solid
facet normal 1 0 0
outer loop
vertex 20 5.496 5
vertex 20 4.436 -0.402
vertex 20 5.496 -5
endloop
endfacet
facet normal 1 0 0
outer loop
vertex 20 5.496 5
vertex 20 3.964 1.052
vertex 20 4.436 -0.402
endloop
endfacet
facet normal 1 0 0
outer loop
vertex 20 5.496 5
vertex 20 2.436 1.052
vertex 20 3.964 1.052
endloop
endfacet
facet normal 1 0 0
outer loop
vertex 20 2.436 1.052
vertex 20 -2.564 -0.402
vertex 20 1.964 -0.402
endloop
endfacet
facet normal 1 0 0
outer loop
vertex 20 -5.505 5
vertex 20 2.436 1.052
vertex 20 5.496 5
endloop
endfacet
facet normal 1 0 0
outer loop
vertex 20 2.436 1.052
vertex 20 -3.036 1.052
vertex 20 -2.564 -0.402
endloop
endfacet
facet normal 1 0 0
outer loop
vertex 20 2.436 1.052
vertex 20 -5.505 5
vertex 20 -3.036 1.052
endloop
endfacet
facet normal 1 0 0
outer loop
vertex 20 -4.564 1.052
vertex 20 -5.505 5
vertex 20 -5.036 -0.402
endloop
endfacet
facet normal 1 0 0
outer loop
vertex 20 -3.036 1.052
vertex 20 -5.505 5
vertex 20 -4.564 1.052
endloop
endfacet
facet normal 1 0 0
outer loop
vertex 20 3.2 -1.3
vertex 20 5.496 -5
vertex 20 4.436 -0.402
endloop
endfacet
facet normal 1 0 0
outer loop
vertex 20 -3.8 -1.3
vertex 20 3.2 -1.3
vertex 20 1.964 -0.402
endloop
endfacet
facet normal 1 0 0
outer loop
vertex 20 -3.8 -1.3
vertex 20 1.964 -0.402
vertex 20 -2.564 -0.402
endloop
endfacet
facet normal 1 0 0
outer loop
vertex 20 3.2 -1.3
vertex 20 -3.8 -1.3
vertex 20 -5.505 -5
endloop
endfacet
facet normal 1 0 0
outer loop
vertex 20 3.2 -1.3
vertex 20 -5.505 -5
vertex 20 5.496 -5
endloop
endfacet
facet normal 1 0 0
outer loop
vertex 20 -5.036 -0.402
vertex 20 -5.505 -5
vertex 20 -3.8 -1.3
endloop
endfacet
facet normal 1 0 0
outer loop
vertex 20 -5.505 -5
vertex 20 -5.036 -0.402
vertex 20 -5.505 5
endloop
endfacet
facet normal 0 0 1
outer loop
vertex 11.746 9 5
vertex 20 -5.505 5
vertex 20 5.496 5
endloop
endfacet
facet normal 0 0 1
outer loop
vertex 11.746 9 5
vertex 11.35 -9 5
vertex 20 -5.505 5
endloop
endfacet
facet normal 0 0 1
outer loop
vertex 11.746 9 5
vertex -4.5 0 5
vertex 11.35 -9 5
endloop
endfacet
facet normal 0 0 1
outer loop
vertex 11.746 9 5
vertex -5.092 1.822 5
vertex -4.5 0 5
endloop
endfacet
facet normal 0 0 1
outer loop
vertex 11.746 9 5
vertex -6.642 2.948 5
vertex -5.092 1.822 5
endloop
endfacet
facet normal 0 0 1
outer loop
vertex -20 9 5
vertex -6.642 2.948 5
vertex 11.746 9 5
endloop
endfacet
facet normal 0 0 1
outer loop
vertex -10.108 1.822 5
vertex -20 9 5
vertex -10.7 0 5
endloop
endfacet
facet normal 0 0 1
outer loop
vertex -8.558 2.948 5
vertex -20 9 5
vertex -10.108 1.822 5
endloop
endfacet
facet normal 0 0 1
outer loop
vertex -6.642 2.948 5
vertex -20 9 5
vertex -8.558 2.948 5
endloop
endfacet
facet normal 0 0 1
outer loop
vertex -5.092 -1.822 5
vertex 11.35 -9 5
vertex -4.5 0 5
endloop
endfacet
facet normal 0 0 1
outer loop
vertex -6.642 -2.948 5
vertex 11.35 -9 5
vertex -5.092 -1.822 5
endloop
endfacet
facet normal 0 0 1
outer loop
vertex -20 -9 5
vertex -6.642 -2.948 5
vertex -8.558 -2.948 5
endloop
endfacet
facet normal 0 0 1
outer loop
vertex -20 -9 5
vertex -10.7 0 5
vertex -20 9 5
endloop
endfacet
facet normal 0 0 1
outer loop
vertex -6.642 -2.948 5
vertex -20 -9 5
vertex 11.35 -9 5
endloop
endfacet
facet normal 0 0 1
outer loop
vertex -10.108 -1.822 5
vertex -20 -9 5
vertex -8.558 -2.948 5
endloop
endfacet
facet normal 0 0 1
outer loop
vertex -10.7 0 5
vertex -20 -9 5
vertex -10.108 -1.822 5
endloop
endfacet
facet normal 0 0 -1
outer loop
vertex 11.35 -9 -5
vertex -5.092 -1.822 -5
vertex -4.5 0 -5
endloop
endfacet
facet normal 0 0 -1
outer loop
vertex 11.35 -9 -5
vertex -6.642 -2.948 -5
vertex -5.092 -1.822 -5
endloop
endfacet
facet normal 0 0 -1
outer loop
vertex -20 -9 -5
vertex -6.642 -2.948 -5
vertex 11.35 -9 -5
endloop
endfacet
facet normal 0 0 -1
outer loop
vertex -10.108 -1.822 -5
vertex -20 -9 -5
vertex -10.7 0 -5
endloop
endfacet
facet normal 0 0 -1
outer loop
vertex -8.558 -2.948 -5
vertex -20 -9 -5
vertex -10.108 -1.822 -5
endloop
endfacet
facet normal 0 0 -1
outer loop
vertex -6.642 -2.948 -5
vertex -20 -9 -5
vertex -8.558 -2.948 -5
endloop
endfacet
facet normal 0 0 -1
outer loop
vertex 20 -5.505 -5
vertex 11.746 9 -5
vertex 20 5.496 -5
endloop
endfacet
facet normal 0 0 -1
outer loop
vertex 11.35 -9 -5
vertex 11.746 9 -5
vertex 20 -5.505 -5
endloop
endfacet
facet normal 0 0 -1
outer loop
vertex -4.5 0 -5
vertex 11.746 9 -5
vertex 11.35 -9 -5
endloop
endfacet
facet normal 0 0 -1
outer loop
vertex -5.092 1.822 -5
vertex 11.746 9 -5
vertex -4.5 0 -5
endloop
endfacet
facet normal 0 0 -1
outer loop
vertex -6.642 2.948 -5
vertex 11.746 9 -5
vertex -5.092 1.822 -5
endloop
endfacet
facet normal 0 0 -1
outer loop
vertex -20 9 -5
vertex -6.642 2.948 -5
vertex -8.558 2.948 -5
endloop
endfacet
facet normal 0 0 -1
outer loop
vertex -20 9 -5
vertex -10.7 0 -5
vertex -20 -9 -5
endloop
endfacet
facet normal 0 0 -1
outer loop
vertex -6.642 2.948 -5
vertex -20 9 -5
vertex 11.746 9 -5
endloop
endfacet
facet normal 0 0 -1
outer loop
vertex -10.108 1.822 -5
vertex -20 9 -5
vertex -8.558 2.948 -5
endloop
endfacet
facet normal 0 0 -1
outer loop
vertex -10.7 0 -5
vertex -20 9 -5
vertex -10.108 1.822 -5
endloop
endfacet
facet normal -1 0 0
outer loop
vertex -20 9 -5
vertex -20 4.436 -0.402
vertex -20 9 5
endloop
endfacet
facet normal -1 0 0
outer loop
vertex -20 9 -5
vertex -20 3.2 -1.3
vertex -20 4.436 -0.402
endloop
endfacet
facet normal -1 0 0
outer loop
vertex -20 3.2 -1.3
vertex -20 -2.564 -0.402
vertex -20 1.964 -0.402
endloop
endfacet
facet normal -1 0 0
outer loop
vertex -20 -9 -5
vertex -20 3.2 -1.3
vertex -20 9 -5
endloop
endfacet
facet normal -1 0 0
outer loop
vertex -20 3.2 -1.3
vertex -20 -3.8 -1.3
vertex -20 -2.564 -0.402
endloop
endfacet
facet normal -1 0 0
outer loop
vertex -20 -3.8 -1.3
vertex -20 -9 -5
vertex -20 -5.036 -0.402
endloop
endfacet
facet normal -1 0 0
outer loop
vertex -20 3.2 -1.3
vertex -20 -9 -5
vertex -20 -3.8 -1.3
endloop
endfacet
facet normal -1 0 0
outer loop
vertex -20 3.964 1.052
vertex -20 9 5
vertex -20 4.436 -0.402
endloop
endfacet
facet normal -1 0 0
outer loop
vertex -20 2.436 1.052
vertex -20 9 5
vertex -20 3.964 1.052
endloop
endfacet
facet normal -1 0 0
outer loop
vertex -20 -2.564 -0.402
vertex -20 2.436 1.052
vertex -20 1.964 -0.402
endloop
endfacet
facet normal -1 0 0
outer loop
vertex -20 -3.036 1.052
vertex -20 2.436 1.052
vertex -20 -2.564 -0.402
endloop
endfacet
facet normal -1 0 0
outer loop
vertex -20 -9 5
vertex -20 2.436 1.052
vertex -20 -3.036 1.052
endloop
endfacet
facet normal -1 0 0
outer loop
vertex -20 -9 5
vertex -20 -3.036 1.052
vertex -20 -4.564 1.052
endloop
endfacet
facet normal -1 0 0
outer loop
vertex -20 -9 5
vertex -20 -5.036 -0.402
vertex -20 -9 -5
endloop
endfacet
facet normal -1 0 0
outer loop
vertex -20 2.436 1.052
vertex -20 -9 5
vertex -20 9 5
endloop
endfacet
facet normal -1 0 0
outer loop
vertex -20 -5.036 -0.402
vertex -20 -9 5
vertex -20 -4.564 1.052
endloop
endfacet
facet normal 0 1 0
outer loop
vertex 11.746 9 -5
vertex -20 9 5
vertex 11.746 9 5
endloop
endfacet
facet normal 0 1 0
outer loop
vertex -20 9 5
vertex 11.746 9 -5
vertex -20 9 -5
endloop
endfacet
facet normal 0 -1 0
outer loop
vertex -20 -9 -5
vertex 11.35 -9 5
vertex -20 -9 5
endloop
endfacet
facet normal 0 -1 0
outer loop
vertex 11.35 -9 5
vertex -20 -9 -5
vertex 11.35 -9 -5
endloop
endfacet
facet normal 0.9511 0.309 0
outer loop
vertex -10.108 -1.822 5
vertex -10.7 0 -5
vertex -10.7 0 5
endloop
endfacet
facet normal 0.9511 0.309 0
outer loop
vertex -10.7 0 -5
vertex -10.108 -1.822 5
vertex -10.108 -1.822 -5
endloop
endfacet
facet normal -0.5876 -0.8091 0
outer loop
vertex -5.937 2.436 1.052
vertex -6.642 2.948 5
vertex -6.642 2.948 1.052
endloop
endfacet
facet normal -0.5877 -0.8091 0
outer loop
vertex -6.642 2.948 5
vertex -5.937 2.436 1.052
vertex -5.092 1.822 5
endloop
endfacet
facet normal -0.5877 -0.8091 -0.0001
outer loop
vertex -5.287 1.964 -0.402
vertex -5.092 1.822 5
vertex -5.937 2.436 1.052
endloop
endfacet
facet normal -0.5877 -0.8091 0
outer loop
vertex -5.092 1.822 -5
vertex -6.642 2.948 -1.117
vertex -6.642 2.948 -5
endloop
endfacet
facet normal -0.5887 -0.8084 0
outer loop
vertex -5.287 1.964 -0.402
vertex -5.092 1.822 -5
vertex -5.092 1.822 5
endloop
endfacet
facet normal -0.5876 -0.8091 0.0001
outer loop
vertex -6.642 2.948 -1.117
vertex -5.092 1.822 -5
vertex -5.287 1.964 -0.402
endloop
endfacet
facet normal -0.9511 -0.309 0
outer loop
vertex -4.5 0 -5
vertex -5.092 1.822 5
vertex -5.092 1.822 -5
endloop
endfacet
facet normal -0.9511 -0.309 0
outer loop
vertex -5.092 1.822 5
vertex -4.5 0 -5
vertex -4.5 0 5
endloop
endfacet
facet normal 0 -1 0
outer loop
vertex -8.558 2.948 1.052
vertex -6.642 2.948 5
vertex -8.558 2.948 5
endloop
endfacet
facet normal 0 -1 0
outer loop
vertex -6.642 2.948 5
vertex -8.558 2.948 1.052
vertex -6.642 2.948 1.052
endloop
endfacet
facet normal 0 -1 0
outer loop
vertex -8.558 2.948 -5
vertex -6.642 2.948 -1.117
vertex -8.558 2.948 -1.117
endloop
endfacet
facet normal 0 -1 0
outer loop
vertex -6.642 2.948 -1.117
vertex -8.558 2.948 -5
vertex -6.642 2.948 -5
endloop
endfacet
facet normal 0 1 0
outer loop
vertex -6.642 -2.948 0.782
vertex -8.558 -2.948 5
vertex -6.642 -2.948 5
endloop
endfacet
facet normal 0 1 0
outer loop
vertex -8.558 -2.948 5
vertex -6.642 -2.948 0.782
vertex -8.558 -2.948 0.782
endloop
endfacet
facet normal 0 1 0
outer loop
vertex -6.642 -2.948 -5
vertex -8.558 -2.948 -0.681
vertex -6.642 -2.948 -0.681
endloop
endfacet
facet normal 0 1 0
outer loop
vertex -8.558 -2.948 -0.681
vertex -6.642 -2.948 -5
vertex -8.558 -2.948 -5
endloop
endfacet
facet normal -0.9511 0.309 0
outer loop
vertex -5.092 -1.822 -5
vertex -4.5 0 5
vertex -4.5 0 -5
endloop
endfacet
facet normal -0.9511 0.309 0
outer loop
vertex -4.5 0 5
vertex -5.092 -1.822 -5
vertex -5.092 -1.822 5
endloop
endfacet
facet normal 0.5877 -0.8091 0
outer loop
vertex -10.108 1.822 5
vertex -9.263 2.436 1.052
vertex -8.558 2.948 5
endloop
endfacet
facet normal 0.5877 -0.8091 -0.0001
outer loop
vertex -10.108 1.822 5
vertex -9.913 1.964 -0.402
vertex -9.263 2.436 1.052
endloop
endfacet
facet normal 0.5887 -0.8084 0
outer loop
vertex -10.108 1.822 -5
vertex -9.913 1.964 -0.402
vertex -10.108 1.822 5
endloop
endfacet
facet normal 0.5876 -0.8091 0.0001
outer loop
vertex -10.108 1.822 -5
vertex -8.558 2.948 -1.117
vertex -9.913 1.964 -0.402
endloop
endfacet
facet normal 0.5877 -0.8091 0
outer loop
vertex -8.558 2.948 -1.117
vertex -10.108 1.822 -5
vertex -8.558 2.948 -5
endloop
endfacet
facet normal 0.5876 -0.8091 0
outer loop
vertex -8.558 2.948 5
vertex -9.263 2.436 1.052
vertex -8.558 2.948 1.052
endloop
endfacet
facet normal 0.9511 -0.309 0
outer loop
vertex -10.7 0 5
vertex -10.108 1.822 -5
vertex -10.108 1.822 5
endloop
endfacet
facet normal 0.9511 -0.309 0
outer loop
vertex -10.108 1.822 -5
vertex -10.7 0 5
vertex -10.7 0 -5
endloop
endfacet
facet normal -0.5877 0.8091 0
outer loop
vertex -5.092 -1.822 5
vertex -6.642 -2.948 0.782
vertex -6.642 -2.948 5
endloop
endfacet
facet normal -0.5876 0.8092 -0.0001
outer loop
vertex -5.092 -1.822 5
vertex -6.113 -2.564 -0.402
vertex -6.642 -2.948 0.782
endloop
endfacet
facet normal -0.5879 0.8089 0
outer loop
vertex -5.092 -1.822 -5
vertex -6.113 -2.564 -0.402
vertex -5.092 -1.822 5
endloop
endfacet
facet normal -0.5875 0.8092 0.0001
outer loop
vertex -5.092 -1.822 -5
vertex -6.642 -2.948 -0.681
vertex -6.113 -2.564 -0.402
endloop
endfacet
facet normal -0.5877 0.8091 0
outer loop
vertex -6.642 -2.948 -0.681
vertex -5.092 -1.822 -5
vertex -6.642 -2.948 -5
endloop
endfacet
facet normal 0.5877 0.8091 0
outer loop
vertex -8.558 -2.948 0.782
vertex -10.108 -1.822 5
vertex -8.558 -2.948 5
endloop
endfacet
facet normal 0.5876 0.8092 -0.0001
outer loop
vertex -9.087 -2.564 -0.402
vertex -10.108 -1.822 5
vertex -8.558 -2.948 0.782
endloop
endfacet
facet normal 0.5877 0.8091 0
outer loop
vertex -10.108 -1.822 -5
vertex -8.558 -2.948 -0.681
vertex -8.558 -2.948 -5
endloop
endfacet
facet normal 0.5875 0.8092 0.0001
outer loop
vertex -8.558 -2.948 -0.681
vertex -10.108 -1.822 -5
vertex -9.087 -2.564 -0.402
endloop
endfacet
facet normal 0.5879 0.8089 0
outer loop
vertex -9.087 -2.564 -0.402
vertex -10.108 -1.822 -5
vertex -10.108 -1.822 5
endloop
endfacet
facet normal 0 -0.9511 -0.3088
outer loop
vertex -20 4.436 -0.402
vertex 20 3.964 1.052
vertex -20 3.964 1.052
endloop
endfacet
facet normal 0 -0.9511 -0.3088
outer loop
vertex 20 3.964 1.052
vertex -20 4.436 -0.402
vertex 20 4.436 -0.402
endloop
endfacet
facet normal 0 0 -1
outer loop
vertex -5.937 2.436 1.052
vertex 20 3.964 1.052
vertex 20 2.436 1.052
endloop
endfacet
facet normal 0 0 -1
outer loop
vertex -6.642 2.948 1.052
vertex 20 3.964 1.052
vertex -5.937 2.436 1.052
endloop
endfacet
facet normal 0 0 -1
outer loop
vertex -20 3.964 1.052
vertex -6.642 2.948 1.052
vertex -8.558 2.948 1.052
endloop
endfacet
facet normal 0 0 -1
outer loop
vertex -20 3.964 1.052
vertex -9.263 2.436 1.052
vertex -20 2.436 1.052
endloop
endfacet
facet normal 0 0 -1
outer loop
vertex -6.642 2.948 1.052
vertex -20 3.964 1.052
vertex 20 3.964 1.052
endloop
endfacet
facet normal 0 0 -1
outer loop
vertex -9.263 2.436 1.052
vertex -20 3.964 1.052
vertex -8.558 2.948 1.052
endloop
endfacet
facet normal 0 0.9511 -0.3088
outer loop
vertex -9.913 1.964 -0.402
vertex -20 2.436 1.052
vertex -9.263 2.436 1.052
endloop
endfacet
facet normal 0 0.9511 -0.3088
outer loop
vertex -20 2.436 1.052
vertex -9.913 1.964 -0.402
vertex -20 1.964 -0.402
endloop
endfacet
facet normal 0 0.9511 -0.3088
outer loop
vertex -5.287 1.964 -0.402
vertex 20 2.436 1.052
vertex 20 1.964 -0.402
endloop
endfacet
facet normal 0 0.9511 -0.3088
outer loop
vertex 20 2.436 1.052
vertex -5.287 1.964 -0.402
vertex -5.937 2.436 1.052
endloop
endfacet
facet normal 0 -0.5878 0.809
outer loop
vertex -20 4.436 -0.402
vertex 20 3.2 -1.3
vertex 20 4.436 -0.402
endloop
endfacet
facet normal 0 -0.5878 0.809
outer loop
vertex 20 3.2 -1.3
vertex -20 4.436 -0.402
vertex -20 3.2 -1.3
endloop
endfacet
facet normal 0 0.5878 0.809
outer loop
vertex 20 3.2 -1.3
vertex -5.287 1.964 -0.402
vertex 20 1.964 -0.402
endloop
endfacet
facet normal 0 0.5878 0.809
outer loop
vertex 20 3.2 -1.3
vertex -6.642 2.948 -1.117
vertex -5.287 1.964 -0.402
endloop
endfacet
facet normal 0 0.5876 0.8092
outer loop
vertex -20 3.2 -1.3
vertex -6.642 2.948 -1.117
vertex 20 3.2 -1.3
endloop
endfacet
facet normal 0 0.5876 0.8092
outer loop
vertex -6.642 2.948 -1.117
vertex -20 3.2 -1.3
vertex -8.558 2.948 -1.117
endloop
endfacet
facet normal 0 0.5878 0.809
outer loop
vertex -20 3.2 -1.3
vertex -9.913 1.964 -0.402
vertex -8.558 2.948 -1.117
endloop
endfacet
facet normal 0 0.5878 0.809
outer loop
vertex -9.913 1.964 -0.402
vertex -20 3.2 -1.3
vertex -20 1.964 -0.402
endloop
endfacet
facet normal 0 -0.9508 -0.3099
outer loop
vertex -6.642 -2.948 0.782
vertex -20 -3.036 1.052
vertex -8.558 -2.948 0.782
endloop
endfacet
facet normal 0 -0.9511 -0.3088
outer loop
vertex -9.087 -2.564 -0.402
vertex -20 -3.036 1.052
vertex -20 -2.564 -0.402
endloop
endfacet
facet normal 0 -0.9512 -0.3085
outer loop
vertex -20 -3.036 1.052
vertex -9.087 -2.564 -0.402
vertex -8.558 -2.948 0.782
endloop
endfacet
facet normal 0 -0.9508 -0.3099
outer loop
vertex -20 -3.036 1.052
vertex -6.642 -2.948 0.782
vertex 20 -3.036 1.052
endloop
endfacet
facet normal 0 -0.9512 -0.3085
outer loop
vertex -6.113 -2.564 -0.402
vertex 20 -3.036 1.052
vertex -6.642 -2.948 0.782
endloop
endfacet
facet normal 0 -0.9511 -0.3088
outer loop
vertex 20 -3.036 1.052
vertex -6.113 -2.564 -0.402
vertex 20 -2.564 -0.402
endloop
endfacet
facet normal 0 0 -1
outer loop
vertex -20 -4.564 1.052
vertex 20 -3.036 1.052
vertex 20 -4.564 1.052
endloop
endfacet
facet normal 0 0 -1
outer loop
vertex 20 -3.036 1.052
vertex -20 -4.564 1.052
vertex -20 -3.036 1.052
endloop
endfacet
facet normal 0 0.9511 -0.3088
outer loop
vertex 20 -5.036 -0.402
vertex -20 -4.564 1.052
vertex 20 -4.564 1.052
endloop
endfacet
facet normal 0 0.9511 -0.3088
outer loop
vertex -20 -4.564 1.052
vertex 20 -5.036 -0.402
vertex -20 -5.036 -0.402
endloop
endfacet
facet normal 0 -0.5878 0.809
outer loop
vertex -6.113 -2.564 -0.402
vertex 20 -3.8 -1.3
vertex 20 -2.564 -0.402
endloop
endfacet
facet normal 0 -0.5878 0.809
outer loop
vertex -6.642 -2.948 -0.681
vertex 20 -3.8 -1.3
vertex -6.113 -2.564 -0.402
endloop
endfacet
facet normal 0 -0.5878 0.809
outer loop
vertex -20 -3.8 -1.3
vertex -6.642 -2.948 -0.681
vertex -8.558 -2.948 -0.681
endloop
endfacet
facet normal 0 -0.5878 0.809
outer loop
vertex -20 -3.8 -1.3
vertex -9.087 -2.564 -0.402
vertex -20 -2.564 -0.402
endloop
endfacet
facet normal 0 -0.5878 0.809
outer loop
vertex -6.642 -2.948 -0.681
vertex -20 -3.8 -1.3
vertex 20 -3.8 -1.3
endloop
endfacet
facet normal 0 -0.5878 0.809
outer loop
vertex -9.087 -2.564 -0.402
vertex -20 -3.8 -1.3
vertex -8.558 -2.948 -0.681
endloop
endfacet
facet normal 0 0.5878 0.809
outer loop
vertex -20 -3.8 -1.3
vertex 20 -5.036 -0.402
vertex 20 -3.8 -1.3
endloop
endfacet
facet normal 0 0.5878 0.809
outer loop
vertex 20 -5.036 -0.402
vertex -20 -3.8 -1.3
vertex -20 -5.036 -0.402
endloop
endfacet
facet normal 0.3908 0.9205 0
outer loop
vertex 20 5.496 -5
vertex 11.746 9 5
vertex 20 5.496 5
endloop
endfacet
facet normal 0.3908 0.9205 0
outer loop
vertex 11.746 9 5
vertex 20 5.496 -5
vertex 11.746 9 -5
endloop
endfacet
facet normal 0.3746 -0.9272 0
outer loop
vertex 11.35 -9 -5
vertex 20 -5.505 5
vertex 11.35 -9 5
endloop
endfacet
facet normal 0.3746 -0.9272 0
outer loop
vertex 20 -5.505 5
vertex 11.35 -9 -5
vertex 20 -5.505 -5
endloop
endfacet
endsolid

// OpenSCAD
module rotary()
{

difference() {
	// BODY (to be subtracted from)
	cube([length,width,thick],center=true);

   // MOTOR SHAFT HOLE 
	translate([4*hradius-length/2, 0, 0])
	   cylinder(r=hradius, h=thickplus, center=true);
	// WIRES
	 translate([0,3.2,0])
	   rotate([0,90,0])
            cylinder(r=dia,h=length+width,center=true);

	 translate([0,-3.8,0])
	   rotate([0,90,0])
            cylinder(r=dia,h=length+width,center=true);

	translate([23,14,0])
		rotate([0,0,67])
			cube([width,width,thickplus],center=true);

	translate([23,-14,0])
		rotate([0,0,22])
			cube([width,width,thickplus],center=true);

	}
}

	alpha  = 12; // Angle between radials in degrees

	length = 40; // mm   Main Block
	width  = 18; // mm
	thick = 10;  // 8mm
    thickplus = 2*thick;

	hradius = 3.1;    // 6.3mm = .25"
	dia     = 1.3;  // 1/16" wire trough
	yoffset = 5;  // ydistance from edge to mounting hole
    zoffset = 5;

rotary();
